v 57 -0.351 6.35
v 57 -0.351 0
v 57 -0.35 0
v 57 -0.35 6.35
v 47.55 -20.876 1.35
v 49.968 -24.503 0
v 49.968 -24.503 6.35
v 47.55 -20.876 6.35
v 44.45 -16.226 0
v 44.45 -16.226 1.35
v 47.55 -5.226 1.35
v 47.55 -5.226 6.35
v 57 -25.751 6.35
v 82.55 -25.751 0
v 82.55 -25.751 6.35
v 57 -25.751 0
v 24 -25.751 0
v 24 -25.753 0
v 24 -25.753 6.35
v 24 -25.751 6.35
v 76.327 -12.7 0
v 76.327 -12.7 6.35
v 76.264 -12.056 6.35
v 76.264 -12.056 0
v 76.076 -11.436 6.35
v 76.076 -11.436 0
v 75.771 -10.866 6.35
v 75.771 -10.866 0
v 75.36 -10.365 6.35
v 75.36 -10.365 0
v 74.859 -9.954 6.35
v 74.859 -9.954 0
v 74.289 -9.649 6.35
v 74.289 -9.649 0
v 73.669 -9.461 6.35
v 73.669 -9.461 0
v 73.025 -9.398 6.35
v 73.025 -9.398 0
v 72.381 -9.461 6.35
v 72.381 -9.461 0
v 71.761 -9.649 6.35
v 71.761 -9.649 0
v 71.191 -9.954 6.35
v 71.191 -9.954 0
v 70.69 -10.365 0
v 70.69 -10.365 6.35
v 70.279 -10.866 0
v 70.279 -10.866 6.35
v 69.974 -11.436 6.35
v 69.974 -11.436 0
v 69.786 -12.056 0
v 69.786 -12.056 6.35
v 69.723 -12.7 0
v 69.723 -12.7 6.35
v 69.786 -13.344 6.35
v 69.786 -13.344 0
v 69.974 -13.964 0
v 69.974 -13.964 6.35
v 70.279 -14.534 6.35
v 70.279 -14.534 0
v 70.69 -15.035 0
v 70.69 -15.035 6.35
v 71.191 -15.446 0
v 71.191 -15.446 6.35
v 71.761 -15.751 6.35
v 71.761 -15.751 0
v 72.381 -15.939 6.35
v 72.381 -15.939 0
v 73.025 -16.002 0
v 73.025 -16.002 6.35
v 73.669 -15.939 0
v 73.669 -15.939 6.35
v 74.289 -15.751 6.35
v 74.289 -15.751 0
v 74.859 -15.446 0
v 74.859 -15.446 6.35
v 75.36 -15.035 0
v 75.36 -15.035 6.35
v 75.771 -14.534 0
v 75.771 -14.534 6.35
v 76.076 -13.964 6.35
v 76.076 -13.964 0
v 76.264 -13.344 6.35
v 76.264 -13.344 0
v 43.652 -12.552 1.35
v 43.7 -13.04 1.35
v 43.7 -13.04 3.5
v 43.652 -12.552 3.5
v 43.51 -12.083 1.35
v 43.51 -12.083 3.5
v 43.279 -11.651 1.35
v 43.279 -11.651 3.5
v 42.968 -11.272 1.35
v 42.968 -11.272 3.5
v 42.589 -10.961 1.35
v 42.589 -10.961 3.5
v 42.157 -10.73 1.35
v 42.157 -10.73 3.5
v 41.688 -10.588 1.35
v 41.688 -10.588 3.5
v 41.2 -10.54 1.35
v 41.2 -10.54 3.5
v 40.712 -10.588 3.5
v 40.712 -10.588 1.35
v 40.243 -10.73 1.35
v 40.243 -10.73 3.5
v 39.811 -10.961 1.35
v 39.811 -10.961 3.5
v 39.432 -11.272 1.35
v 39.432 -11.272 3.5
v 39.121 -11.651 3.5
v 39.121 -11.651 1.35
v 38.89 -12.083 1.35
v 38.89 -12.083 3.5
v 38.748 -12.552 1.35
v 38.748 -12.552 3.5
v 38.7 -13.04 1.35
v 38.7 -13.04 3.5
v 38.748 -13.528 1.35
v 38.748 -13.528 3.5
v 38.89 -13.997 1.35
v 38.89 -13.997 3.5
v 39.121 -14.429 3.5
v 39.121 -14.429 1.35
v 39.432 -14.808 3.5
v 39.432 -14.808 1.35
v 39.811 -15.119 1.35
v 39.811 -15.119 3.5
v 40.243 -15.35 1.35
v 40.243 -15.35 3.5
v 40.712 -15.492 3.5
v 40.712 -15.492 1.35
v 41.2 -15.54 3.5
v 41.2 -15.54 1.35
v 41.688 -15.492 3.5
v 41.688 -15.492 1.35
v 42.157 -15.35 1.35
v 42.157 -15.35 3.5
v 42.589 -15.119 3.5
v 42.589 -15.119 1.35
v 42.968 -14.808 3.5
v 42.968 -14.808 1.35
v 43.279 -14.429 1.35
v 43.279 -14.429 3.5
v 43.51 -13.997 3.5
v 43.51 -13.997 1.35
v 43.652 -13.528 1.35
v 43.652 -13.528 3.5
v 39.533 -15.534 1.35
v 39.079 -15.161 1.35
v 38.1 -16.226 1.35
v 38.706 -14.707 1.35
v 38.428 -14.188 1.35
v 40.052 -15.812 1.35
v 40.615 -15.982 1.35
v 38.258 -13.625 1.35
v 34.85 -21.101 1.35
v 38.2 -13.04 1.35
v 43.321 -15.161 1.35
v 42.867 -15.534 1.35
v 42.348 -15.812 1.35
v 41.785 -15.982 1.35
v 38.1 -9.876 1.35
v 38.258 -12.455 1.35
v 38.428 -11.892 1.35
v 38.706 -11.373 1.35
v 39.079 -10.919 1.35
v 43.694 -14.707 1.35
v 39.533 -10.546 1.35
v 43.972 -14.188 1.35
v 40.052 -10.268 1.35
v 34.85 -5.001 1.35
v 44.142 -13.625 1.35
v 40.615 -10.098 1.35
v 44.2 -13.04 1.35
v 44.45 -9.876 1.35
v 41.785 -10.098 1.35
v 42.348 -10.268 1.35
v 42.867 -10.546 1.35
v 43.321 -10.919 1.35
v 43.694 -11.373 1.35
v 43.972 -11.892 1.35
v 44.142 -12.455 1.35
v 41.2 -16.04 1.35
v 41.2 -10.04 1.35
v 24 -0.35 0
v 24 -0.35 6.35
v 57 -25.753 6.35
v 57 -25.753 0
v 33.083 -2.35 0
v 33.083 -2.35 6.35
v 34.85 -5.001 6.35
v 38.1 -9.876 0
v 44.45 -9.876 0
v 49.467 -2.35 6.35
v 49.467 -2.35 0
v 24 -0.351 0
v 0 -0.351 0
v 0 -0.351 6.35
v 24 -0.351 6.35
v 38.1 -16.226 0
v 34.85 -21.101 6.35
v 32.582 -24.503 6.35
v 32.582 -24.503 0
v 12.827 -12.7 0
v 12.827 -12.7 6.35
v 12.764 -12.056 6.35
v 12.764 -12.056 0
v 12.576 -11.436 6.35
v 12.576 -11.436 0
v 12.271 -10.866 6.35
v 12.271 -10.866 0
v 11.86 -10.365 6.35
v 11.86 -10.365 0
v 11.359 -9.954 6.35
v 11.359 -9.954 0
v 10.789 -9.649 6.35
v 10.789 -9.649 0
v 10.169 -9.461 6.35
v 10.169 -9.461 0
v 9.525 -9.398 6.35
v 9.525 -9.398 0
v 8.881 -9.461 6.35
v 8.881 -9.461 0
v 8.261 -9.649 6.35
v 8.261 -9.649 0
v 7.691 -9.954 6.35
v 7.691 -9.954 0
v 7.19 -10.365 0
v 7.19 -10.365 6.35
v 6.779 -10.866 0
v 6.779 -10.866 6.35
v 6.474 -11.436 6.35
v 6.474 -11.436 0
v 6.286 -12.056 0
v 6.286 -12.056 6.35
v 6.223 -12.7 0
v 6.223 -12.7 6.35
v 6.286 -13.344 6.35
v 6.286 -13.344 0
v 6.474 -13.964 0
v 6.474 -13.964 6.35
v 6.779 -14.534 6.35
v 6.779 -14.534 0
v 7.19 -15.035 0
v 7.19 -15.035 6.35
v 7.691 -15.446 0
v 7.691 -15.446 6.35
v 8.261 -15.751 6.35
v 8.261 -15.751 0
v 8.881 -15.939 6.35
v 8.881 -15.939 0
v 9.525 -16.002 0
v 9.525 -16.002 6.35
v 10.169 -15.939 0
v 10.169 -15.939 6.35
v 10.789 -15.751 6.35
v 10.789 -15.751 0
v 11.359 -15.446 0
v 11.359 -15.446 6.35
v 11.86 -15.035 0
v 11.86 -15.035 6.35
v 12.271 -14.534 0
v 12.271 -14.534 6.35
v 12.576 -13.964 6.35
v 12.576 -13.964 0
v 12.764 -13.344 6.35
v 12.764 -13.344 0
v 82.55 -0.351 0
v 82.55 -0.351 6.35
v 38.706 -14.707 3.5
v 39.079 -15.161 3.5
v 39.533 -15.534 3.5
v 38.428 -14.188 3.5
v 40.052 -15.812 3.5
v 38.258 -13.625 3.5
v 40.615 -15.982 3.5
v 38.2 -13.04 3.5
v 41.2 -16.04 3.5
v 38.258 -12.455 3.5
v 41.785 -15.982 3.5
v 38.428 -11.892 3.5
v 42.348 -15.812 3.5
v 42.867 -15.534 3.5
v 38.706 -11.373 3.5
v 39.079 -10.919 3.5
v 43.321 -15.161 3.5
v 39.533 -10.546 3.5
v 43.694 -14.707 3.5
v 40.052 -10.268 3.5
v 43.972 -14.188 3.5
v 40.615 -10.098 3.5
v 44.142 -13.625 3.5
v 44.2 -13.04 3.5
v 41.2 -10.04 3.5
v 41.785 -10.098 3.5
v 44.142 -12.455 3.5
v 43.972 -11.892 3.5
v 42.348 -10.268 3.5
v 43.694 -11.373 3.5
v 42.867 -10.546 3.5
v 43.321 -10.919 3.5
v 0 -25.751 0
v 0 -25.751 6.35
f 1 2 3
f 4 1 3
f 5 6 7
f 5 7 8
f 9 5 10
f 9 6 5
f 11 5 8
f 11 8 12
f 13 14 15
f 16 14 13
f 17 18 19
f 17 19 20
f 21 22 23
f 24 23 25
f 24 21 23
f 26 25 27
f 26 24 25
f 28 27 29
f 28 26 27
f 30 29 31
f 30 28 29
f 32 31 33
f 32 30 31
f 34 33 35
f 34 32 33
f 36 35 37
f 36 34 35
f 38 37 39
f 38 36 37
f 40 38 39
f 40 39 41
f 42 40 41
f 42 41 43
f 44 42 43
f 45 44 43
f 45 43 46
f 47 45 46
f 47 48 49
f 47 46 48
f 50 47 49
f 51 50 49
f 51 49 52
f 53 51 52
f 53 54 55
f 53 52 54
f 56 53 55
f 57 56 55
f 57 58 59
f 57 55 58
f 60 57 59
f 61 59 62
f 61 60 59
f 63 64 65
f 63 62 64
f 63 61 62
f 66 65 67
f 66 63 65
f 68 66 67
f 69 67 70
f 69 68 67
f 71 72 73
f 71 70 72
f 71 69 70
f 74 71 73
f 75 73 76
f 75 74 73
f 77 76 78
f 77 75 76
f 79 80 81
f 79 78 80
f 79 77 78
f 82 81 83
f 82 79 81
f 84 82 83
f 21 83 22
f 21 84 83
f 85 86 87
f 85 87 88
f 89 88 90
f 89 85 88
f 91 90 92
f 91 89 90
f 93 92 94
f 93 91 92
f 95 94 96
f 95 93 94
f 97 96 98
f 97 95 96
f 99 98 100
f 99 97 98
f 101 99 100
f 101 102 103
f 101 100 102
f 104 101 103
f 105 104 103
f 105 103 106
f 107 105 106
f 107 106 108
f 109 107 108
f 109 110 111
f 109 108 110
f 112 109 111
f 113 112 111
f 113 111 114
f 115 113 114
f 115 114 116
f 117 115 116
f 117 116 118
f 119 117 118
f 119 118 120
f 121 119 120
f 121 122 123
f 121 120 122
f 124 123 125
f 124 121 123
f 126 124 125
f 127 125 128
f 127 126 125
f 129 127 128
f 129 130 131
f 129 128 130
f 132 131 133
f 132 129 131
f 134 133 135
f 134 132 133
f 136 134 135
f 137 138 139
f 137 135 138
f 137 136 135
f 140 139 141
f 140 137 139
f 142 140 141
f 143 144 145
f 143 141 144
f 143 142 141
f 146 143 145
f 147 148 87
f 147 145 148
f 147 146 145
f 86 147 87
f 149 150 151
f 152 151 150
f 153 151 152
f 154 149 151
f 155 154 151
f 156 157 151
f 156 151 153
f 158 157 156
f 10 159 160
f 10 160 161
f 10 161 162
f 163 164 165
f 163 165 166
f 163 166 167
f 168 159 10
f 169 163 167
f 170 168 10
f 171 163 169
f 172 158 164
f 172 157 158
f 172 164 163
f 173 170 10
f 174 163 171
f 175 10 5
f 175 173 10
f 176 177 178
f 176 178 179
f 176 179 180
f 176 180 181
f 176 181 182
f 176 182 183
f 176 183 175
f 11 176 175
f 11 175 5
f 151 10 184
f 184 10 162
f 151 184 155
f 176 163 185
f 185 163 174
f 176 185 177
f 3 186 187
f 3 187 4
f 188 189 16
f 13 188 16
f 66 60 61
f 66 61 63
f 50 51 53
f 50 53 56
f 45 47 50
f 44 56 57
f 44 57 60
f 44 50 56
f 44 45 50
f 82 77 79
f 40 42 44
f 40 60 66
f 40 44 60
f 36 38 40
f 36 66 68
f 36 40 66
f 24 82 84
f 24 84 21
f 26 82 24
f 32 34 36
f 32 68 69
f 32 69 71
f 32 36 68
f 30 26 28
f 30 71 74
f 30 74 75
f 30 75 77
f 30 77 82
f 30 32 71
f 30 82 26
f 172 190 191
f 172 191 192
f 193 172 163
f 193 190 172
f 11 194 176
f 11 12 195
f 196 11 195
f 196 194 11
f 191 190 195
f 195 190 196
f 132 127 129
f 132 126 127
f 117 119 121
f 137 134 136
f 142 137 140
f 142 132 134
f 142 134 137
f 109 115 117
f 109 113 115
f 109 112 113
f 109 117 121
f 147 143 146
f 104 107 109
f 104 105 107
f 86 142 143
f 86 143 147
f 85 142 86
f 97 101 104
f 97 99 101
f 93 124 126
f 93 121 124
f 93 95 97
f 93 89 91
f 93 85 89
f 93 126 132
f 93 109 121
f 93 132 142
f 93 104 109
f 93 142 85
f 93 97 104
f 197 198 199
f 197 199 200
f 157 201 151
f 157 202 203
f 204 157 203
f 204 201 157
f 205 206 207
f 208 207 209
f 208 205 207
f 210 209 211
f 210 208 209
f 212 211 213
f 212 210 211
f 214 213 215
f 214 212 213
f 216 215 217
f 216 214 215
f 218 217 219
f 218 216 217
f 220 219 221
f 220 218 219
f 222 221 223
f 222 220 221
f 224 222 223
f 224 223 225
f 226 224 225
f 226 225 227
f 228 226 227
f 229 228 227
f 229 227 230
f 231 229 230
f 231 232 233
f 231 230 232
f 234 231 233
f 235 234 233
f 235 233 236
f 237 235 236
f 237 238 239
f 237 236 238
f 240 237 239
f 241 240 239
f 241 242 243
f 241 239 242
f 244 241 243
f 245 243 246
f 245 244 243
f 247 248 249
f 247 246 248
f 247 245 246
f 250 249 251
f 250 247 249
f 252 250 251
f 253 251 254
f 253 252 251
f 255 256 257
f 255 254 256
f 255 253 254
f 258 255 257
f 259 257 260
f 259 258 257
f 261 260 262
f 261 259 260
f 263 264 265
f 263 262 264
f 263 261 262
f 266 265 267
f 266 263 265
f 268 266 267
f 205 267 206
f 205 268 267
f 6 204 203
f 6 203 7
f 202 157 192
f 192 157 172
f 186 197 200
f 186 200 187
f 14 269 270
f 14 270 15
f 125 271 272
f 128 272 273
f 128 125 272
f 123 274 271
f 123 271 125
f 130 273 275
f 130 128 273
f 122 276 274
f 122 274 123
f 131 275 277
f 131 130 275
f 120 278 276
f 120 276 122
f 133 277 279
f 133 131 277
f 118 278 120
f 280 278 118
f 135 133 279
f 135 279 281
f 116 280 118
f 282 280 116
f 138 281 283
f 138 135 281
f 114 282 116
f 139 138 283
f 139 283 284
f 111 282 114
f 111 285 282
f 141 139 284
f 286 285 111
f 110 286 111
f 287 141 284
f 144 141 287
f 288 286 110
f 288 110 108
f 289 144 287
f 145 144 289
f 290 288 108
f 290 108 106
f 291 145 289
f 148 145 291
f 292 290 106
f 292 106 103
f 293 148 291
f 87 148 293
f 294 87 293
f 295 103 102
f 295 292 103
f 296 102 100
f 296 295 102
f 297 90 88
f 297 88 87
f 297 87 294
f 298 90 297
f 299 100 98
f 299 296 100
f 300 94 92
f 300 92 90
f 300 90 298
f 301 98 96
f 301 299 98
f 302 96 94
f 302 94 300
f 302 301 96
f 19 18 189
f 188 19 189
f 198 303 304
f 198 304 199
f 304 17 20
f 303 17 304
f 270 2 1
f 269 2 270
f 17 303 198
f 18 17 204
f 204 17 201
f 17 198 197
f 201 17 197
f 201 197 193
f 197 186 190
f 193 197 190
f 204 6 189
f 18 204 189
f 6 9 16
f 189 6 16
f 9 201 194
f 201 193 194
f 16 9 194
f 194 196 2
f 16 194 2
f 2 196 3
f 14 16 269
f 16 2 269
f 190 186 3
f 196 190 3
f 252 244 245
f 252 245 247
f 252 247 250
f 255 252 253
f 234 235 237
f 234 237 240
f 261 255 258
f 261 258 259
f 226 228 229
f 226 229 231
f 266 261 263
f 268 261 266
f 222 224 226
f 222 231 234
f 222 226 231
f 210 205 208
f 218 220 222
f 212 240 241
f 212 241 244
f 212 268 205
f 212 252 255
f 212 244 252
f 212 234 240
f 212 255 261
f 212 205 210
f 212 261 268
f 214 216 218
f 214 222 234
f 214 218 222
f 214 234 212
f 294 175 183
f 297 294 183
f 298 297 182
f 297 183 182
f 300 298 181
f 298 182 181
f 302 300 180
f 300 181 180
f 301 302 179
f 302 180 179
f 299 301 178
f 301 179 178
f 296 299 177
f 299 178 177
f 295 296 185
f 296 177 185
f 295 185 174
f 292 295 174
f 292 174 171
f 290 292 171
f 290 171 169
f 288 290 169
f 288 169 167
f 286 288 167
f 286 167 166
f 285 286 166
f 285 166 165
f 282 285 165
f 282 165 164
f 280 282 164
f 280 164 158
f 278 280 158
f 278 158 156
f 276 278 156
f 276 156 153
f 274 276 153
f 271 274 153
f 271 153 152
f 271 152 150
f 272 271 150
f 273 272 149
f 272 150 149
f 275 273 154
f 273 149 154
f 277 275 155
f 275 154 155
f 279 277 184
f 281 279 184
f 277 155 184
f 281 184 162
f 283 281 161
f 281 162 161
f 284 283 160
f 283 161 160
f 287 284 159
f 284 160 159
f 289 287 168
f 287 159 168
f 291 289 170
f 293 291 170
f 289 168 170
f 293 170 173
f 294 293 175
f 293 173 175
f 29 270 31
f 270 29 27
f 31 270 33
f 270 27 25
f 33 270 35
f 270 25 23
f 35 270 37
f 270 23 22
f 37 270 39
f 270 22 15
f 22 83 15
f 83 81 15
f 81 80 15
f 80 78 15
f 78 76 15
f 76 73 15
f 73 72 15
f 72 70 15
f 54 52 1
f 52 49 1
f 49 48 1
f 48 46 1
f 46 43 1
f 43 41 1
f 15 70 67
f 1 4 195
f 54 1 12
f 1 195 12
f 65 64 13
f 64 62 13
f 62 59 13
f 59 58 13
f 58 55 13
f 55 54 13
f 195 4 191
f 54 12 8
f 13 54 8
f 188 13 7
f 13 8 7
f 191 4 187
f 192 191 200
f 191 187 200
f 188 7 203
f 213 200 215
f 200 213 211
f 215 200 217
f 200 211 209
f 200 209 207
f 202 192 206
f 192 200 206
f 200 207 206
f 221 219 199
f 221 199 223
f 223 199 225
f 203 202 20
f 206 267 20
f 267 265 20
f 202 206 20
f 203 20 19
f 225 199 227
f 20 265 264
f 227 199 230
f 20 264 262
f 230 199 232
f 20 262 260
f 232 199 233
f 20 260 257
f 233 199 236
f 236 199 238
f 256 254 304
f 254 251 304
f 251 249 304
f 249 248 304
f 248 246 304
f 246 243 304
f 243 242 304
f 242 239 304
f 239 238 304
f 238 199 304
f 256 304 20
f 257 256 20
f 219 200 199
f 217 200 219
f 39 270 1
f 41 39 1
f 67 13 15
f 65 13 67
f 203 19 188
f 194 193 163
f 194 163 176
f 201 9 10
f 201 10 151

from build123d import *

# Parameters (mm, degrees)
BOX_W             = 33
BOX_H             = 2
BOX_DEPTH         = 6.35
CYLINDER001_R     = 3.302
CYLINDER001_DEPTH = 10
BOX002_W          = 12.7
BOX002_H          = 16.7
BOX002_DEPTH      = 17
CYLINDER_R        = 3.302
CYLINDER_DEPTH    = 10
EXTRUDE_DEPTH     = 6.35
CYLINDER003_R     = 2.5
CYLINDER003_DEPTH = 16
CYLINDER002_R     = 3
CYLINDER002_DEPTH = 3.5
BOX001_W          = 33
BOX001_H          = 1.25
BOX001_DEPTH      = 6.35


with BuildPart() as support1:
    # Box → Box (new body)
    with BuildSketch(Plane(origin=(24, -2.35, 0), x_dir=(1, 0, 0), z_dir=(0, 0, 1))):
        with Locations((16.5, 1)):
            Rectangle(BOX_W, BOX_H)
    extrude(amount=BOX_DEPTH)


with BuildPart() as hole2:
    # Cylinder001 → Cylinder001 (new body)
    with BuildSketch(Plane(origin=(73.025, -12.7, 1e-05), x_dir=(1, 0, 0), z_dir=(0, 0, 1))):
        Circle(CYLINDER001_R)
    extrude(amount=CYLINDER001_DEPTH)


with BuildPart() as thinner:
    # Box002 → Box002 (new body)
    with BuildSketch(Plane(origin=(34.85, -21.35, 1.35), x_dir=(1, 0, 0), z_dir=(0, 0, 1))):
        with Locations((6.35, 8.35)):
            Rectangle(BOX002_W, BOX002_H)
    extrude(amount=BOX002_DEPTH)


with BuildPart() as fusion:
    # Cylinder → Cylinder (new body)
    with BuildSketch(Plane(origin=(9.525, -12.7, 1e-05), x_dir=(1, 0, 0), z_dir=(0, 0, 1))):
        Circle(CYLINDER_R)
    extrude(amount=CYLINDER_DEPTH)

    # Fusion: union Hole2, Thinner
    add(hole2.part)
    add(thinner.part)


with BuildPart() as cut:
    # rect3338 → Extrude (new body)
    with BuildSketch(Plane(origin=(41.275, -13.050916, 0), x_dir=(0, -1, 0), z_dir=(0, 0, -1))):
        with BuildLine():
            add(Edge.make_bspline(
                [(-12.7, 41.275), (-12.7, 9.525)],
                knots=[0, 0, 112.5, 112.5], degree=1))
            add(Edge.make_bspline(
                [(-12.7, 9.525), (-3.175, 3.175)],
                knots=[0, 0, 40.562452, 40.562452], degree=1))
            add(Edge.make_bspline(
                [(-3.175, 3.175), (-3.175, -3.175)],
                knots=[0, 0, 22.5, 22.5], degree=1))
            add(Edge.make_bspline(
                [(-3.175, -3.175), (-12.7, -9.525)],
                knots=[0, 0, 40.562452, 40.562452], degree=1))
            add(Edge.make_bspline(
                [(-12.7, -9.525), (-12.7, -41.275)],
                knots=[0, 0, 112.5, 112.5], degree=1))
            add(Edge.make_bspline(
                [(-12.7, -41.275), (12.7, -41.275)],
                knots=[0, 0, 90, 90], degree=1))
            add(Edge.make_bspline(
                [(12.7, -41.275), (12.7, -9.525)],
                knots=[0, 0, 112.5, 112.5], degree=1))
            add(Edge.make_bspline(
                [(12.7, -9.525), (3.175, -3.175)],
                knots=[0, 0, 40.562452, 40.562452], degree=1))
            add(Edge.make_bspline(
                [(3.175, -3.175), (3.175, 3.175)],
                knots=[0, 0, 22.5, 22.5], degree=1))
            add(Edge.make_bspline(
                [(3.175, 3.175), (12.7, 9.525)],
                knots=[0, 0, 40.562452, 40.562452], degree=1))
            add(Edge.make_bspline(
                [(12.7, 9.525), (12.7, 41.275)],
                knots=[0, 0, 112.5, 112.5], degree=1))
            add(Edge.make_bspline(
                [(12.7, 41.275), (-12.7, 41.275)],
                knots=[0, 0, 90, 90], degree=1))
        make_face()
    extrude(amount=-EXTRUDE_DEPTH)

    # Cut: cut Fusion
    add(fusion.part, mode=Mode.SUBTRACT)


with BuildPart() as cylinder001:
    # Cylinder003 → Cylinder003 (new body)
    with BuildSketch(Plane(origin=(41.2, -13.04, 0), x_dir=(1, 0, 0), z_dir=(0, 0, 1))):
        Circle(CYLINDER003_R)
    extrude(amount=CYLINDER003_DEPTH)


with BuildPart() as cut001:
    # Cylinder002 → Cylinder002 (new body)
    with BuildSketch(Plane(origin=(41.2, -13.04, 0), x_dir=(1, 0, 0), z_dir=(0, 0, 1))):
        Circle(CYLINDER002_R)
    extrude(amount=CYLINDER002_DEPTH)

    # Cut001: cut Cylinder001
    add(cylinder001.part, mode=Mode.SUBTRACT)


with BuildPart() as fusion001:
    # Box001 → Box001 (new body)
    with BuildSketch(Plane(origin=(24, -25.753, 0), x_dir=(1, 0, 0), z_dir=(0, 0, 1))):
        with Locations((16.5, 0.625)):
            Rectangle(BOX001_W, BOX001_H)
    extrude(amount=BOX001_DEPTH)

    # Fusion001: union Support1, Cut, Cut001
    add(support1.part)
    add(cut.part)
    add(cut001.part)


solid = fusion001.part
